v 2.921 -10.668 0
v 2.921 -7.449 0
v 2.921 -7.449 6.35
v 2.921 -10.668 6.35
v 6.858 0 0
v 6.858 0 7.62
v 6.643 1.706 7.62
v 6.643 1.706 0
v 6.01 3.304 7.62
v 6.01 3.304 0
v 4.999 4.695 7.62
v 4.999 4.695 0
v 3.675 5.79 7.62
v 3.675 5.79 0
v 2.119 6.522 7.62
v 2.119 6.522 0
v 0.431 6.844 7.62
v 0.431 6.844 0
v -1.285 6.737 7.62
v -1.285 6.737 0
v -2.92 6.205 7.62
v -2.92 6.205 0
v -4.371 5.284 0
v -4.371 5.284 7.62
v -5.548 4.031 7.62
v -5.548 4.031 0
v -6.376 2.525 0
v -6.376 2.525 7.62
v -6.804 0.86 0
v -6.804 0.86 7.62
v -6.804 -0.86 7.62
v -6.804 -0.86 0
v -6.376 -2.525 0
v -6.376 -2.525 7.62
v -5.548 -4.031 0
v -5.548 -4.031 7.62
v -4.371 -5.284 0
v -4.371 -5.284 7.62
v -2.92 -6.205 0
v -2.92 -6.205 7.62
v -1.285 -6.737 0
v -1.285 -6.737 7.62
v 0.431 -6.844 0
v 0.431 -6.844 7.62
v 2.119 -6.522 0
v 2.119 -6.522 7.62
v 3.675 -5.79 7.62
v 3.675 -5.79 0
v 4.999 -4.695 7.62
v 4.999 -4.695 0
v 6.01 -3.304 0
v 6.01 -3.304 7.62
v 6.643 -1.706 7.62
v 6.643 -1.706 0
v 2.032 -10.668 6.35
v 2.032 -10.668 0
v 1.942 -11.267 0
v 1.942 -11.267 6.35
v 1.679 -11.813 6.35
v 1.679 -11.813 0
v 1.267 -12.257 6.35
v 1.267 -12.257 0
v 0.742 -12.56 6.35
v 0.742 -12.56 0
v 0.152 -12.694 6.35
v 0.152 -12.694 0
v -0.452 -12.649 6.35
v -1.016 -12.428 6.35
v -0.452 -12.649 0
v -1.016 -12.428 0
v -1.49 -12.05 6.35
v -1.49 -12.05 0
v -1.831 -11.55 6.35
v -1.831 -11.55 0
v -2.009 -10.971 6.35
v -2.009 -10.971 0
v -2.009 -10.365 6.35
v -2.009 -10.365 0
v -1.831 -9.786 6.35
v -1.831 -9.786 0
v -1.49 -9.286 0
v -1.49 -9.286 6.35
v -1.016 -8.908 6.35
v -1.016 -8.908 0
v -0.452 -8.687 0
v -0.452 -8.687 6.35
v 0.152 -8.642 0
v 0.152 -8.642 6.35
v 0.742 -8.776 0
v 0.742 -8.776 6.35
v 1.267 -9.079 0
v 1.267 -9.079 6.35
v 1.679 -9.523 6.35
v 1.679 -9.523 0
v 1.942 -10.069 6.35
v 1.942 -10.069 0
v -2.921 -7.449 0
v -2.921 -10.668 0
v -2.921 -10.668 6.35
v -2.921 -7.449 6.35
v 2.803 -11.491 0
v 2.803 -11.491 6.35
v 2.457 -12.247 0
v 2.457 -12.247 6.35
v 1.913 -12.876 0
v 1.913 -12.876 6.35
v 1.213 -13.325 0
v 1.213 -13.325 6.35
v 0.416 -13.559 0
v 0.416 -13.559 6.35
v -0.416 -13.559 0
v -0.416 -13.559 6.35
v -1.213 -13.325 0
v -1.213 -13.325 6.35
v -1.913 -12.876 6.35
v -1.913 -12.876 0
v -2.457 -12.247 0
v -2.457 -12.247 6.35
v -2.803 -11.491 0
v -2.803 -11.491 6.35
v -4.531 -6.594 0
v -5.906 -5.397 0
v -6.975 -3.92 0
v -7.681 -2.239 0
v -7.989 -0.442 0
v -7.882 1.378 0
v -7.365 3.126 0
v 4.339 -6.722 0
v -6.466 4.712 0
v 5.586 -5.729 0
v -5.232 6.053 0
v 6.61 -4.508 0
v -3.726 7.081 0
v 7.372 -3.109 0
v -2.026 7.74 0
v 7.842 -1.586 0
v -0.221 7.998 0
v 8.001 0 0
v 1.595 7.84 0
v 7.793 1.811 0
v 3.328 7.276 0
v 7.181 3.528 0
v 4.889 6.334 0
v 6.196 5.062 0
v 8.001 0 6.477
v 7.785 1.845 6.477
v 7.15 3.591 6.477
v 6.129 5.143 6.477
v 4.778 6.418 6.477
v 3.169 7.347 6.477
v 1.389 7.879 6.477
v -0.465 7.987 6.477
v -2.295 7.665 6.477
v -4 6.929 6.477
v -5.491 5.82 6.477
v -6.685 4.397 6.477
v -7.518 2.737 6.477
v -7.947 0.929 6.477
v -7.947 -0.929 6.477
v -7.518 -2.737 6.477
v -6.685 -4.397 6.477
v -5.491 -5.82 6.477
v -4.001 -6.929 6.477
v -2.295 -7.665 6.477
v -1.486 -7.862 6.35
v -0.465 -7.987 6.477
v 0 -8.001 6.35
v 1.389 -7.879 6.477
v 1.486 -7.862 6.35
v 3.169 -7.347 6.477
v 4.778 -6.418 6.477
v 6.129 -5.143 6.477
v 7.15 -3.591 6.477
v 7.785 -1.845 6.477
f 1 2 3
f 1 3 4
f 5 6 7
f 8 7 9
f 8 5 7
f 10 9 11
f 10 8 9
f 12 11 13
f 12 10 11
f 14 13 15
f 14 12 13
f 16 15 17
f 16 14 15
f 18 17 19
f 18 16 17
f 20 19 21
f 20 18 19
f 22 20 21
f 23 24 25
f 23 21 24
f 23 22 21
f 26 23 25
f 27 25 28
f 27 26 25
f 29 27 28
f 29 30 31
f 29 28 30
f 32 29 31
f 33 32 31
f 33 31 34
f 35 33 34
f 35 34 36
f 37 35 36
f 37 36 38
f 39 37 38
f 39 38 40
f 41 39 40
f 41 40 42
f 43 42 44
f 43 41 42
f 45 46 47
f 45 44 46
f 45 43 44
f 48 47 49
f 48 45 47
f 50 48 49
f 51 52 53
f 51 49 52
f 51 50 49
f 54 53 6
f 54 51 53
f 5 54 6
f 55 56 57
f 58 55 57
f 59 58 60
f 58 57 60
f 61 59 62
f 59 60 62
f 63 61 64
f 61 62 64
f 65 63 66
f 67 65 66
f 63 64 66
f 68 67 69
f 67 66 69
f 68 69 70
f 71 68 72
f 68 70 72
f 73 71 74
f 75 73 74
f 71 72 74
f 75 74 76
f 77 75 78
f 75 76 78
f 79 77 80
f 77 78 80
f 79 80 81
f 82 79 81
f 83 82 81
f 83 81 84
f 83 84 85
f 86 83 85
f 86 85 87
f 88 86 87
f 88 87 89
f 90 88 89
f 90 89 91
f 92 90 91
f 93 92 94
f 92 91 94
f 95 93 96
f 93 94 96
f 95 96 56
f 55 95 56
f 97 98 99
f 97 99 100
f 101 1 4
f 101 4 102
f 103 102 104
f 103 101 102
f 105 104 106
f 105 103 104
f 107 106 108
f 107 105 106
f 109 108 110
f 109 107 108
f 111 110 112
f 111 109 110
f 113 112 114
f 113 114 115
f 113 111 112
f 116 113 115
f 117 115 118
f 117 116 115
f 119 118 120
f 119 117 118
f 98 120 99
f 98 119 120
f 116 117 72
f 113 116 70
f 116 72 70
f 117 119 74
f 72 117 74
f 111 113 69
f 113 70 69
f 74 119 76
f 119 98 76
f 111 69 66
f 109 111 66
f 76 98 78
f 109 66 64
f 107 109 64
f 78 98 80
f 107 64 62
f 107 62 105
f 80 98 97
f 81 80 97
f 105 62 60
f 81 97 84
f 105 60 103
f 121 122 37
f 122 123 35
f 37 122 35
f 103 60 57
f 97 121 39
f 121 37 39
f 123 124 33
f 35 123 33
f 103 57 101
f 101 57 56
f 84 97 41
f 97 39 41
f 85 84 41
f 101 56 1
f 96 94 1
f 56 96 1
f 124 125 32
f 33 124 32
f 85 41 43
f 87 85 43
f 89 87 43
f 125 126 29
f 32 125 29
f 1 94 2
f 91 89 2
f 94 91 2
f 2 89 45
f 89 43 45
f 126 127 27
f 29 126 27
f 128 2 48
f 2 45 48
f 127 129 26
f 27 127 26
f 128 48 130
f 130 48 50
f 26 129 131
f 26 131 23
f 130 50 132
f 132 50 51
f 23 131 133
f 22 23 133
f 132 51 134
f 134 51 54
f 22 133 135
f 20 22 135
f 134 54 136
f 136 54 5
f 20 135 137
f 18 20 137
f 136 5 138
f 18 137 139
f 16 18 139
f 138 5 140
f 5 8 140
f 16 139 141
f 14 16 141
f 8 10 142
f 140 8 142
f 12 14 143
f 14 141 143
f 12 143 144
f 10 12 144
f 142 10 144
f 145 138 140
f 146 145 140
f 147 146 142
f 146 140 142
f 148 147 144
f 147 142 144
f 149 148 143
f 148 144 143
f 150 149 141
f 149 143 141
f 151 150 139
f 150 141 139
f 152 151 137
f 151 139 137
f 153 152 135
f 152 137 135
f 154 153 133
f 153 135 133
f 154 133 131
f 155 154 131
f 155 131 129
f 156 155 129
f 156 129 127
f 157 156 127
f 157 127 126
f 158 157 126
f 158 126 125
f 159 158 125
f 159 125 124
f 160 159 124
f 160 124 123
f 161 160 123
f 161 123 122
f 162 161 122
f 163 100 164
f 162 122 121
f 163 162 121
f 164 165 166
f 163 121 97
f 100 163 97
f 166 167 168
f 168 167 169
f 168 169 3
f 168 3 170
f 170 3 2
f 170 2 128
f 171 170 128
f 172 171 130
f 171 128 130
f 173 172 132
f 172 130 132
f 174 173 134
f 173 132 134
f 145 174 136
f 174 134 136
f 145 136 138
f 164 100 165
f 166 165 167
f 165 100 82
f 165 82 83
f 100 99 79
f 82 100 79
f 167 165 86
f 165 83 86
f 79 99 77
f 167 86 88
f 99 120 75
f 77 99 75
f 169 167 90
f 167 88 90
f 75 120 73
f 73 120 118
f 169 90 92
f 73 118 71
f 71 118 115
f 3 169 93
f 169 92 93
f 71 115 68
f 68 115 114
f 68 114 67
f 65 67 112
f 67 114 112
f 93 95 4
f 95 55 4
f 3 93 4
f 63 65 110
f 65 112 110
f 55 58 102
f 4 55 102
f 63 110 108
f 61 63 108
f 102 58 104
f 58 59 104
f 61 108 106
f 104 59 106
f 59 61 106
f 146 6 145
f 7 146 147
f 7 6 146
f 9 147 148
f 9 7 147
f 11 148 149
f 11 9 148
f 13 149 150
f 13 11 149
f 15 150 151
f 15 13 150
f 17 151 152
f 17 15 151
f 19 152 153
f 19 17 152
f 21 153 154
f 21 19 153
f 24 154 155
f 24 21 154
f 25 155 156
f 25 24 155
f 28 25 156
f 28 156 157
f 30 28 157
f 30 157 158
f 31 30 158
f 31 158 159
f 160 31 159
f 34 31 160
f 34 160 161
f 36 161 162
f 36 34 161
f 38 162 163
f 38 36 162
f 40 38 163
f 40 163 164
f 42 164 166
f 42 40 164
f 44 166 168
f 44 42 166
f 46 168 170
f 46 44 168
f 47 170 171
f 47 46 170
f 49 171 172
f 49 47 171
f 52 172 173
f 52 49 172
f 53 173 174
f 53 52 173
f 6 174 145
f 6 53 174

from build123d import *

# Parameters (mm, degrees)
F0_R     = 8.001
F0_R_2   = 6.858
F1_DEPTH = 7.747
F3_R     = 2.032
F4_DEPTH = 6.35


# Not quite as in the source:
# - a fillet or chamfer that OpenCascade refuses, or shapes differently, is made with other operations: its cross-section is extruded or revolved along the edge and cut away or added


with BuildPart() as f1:
    # F0 (on Top) → F1 (new body)
    with BuildSketch(Plane.XY):
        Circle(F0_R)
        Circle(F0_R_2, mode=Mode.SUBTRACT)
    extrude(amount=F1_DEPTH)

    # F2: chamfer of 1.27 on 1 edges, made by hand

    # F2_s1 → F2_t2 (revolve, cut)
    with BuildSketch(Plane.XZ):
        Polygon((8.001, 6.477), (6.731, 7.747), (8.001, 7.747), align=None)
    revolve(axis=Axis((0, 0, 7.747), (0, 0, 1)), mode=Mode.SUBTRACT)

    # F3 (on face) → F4 (join)
    with BuildSketch(Plane(origin=(0, 0, 0), x_dir=(1, 0, 0), z_dir=(0, 0, -1))):
        with BuildLine():
            Line((2.921, 7.4487421757), (2.921, 10.668))
            ThreePointArc((2.921, 10.668), (0, 13.589), (-2.921, 10.668))
            Line((-2.921, 10.668), (-2.921, 7.4487421757))
            ThreePointArc((-2.921, 7.4487421757), (0, 8.001), (2.921, 7.4487421757))
        make_face()
        with Locations((0, 10.668)):
            Circle(F3_R, mode=Mode.SUBTRACT)
    extrude(amount=-F4_DEPTH)


solid = f1.part
